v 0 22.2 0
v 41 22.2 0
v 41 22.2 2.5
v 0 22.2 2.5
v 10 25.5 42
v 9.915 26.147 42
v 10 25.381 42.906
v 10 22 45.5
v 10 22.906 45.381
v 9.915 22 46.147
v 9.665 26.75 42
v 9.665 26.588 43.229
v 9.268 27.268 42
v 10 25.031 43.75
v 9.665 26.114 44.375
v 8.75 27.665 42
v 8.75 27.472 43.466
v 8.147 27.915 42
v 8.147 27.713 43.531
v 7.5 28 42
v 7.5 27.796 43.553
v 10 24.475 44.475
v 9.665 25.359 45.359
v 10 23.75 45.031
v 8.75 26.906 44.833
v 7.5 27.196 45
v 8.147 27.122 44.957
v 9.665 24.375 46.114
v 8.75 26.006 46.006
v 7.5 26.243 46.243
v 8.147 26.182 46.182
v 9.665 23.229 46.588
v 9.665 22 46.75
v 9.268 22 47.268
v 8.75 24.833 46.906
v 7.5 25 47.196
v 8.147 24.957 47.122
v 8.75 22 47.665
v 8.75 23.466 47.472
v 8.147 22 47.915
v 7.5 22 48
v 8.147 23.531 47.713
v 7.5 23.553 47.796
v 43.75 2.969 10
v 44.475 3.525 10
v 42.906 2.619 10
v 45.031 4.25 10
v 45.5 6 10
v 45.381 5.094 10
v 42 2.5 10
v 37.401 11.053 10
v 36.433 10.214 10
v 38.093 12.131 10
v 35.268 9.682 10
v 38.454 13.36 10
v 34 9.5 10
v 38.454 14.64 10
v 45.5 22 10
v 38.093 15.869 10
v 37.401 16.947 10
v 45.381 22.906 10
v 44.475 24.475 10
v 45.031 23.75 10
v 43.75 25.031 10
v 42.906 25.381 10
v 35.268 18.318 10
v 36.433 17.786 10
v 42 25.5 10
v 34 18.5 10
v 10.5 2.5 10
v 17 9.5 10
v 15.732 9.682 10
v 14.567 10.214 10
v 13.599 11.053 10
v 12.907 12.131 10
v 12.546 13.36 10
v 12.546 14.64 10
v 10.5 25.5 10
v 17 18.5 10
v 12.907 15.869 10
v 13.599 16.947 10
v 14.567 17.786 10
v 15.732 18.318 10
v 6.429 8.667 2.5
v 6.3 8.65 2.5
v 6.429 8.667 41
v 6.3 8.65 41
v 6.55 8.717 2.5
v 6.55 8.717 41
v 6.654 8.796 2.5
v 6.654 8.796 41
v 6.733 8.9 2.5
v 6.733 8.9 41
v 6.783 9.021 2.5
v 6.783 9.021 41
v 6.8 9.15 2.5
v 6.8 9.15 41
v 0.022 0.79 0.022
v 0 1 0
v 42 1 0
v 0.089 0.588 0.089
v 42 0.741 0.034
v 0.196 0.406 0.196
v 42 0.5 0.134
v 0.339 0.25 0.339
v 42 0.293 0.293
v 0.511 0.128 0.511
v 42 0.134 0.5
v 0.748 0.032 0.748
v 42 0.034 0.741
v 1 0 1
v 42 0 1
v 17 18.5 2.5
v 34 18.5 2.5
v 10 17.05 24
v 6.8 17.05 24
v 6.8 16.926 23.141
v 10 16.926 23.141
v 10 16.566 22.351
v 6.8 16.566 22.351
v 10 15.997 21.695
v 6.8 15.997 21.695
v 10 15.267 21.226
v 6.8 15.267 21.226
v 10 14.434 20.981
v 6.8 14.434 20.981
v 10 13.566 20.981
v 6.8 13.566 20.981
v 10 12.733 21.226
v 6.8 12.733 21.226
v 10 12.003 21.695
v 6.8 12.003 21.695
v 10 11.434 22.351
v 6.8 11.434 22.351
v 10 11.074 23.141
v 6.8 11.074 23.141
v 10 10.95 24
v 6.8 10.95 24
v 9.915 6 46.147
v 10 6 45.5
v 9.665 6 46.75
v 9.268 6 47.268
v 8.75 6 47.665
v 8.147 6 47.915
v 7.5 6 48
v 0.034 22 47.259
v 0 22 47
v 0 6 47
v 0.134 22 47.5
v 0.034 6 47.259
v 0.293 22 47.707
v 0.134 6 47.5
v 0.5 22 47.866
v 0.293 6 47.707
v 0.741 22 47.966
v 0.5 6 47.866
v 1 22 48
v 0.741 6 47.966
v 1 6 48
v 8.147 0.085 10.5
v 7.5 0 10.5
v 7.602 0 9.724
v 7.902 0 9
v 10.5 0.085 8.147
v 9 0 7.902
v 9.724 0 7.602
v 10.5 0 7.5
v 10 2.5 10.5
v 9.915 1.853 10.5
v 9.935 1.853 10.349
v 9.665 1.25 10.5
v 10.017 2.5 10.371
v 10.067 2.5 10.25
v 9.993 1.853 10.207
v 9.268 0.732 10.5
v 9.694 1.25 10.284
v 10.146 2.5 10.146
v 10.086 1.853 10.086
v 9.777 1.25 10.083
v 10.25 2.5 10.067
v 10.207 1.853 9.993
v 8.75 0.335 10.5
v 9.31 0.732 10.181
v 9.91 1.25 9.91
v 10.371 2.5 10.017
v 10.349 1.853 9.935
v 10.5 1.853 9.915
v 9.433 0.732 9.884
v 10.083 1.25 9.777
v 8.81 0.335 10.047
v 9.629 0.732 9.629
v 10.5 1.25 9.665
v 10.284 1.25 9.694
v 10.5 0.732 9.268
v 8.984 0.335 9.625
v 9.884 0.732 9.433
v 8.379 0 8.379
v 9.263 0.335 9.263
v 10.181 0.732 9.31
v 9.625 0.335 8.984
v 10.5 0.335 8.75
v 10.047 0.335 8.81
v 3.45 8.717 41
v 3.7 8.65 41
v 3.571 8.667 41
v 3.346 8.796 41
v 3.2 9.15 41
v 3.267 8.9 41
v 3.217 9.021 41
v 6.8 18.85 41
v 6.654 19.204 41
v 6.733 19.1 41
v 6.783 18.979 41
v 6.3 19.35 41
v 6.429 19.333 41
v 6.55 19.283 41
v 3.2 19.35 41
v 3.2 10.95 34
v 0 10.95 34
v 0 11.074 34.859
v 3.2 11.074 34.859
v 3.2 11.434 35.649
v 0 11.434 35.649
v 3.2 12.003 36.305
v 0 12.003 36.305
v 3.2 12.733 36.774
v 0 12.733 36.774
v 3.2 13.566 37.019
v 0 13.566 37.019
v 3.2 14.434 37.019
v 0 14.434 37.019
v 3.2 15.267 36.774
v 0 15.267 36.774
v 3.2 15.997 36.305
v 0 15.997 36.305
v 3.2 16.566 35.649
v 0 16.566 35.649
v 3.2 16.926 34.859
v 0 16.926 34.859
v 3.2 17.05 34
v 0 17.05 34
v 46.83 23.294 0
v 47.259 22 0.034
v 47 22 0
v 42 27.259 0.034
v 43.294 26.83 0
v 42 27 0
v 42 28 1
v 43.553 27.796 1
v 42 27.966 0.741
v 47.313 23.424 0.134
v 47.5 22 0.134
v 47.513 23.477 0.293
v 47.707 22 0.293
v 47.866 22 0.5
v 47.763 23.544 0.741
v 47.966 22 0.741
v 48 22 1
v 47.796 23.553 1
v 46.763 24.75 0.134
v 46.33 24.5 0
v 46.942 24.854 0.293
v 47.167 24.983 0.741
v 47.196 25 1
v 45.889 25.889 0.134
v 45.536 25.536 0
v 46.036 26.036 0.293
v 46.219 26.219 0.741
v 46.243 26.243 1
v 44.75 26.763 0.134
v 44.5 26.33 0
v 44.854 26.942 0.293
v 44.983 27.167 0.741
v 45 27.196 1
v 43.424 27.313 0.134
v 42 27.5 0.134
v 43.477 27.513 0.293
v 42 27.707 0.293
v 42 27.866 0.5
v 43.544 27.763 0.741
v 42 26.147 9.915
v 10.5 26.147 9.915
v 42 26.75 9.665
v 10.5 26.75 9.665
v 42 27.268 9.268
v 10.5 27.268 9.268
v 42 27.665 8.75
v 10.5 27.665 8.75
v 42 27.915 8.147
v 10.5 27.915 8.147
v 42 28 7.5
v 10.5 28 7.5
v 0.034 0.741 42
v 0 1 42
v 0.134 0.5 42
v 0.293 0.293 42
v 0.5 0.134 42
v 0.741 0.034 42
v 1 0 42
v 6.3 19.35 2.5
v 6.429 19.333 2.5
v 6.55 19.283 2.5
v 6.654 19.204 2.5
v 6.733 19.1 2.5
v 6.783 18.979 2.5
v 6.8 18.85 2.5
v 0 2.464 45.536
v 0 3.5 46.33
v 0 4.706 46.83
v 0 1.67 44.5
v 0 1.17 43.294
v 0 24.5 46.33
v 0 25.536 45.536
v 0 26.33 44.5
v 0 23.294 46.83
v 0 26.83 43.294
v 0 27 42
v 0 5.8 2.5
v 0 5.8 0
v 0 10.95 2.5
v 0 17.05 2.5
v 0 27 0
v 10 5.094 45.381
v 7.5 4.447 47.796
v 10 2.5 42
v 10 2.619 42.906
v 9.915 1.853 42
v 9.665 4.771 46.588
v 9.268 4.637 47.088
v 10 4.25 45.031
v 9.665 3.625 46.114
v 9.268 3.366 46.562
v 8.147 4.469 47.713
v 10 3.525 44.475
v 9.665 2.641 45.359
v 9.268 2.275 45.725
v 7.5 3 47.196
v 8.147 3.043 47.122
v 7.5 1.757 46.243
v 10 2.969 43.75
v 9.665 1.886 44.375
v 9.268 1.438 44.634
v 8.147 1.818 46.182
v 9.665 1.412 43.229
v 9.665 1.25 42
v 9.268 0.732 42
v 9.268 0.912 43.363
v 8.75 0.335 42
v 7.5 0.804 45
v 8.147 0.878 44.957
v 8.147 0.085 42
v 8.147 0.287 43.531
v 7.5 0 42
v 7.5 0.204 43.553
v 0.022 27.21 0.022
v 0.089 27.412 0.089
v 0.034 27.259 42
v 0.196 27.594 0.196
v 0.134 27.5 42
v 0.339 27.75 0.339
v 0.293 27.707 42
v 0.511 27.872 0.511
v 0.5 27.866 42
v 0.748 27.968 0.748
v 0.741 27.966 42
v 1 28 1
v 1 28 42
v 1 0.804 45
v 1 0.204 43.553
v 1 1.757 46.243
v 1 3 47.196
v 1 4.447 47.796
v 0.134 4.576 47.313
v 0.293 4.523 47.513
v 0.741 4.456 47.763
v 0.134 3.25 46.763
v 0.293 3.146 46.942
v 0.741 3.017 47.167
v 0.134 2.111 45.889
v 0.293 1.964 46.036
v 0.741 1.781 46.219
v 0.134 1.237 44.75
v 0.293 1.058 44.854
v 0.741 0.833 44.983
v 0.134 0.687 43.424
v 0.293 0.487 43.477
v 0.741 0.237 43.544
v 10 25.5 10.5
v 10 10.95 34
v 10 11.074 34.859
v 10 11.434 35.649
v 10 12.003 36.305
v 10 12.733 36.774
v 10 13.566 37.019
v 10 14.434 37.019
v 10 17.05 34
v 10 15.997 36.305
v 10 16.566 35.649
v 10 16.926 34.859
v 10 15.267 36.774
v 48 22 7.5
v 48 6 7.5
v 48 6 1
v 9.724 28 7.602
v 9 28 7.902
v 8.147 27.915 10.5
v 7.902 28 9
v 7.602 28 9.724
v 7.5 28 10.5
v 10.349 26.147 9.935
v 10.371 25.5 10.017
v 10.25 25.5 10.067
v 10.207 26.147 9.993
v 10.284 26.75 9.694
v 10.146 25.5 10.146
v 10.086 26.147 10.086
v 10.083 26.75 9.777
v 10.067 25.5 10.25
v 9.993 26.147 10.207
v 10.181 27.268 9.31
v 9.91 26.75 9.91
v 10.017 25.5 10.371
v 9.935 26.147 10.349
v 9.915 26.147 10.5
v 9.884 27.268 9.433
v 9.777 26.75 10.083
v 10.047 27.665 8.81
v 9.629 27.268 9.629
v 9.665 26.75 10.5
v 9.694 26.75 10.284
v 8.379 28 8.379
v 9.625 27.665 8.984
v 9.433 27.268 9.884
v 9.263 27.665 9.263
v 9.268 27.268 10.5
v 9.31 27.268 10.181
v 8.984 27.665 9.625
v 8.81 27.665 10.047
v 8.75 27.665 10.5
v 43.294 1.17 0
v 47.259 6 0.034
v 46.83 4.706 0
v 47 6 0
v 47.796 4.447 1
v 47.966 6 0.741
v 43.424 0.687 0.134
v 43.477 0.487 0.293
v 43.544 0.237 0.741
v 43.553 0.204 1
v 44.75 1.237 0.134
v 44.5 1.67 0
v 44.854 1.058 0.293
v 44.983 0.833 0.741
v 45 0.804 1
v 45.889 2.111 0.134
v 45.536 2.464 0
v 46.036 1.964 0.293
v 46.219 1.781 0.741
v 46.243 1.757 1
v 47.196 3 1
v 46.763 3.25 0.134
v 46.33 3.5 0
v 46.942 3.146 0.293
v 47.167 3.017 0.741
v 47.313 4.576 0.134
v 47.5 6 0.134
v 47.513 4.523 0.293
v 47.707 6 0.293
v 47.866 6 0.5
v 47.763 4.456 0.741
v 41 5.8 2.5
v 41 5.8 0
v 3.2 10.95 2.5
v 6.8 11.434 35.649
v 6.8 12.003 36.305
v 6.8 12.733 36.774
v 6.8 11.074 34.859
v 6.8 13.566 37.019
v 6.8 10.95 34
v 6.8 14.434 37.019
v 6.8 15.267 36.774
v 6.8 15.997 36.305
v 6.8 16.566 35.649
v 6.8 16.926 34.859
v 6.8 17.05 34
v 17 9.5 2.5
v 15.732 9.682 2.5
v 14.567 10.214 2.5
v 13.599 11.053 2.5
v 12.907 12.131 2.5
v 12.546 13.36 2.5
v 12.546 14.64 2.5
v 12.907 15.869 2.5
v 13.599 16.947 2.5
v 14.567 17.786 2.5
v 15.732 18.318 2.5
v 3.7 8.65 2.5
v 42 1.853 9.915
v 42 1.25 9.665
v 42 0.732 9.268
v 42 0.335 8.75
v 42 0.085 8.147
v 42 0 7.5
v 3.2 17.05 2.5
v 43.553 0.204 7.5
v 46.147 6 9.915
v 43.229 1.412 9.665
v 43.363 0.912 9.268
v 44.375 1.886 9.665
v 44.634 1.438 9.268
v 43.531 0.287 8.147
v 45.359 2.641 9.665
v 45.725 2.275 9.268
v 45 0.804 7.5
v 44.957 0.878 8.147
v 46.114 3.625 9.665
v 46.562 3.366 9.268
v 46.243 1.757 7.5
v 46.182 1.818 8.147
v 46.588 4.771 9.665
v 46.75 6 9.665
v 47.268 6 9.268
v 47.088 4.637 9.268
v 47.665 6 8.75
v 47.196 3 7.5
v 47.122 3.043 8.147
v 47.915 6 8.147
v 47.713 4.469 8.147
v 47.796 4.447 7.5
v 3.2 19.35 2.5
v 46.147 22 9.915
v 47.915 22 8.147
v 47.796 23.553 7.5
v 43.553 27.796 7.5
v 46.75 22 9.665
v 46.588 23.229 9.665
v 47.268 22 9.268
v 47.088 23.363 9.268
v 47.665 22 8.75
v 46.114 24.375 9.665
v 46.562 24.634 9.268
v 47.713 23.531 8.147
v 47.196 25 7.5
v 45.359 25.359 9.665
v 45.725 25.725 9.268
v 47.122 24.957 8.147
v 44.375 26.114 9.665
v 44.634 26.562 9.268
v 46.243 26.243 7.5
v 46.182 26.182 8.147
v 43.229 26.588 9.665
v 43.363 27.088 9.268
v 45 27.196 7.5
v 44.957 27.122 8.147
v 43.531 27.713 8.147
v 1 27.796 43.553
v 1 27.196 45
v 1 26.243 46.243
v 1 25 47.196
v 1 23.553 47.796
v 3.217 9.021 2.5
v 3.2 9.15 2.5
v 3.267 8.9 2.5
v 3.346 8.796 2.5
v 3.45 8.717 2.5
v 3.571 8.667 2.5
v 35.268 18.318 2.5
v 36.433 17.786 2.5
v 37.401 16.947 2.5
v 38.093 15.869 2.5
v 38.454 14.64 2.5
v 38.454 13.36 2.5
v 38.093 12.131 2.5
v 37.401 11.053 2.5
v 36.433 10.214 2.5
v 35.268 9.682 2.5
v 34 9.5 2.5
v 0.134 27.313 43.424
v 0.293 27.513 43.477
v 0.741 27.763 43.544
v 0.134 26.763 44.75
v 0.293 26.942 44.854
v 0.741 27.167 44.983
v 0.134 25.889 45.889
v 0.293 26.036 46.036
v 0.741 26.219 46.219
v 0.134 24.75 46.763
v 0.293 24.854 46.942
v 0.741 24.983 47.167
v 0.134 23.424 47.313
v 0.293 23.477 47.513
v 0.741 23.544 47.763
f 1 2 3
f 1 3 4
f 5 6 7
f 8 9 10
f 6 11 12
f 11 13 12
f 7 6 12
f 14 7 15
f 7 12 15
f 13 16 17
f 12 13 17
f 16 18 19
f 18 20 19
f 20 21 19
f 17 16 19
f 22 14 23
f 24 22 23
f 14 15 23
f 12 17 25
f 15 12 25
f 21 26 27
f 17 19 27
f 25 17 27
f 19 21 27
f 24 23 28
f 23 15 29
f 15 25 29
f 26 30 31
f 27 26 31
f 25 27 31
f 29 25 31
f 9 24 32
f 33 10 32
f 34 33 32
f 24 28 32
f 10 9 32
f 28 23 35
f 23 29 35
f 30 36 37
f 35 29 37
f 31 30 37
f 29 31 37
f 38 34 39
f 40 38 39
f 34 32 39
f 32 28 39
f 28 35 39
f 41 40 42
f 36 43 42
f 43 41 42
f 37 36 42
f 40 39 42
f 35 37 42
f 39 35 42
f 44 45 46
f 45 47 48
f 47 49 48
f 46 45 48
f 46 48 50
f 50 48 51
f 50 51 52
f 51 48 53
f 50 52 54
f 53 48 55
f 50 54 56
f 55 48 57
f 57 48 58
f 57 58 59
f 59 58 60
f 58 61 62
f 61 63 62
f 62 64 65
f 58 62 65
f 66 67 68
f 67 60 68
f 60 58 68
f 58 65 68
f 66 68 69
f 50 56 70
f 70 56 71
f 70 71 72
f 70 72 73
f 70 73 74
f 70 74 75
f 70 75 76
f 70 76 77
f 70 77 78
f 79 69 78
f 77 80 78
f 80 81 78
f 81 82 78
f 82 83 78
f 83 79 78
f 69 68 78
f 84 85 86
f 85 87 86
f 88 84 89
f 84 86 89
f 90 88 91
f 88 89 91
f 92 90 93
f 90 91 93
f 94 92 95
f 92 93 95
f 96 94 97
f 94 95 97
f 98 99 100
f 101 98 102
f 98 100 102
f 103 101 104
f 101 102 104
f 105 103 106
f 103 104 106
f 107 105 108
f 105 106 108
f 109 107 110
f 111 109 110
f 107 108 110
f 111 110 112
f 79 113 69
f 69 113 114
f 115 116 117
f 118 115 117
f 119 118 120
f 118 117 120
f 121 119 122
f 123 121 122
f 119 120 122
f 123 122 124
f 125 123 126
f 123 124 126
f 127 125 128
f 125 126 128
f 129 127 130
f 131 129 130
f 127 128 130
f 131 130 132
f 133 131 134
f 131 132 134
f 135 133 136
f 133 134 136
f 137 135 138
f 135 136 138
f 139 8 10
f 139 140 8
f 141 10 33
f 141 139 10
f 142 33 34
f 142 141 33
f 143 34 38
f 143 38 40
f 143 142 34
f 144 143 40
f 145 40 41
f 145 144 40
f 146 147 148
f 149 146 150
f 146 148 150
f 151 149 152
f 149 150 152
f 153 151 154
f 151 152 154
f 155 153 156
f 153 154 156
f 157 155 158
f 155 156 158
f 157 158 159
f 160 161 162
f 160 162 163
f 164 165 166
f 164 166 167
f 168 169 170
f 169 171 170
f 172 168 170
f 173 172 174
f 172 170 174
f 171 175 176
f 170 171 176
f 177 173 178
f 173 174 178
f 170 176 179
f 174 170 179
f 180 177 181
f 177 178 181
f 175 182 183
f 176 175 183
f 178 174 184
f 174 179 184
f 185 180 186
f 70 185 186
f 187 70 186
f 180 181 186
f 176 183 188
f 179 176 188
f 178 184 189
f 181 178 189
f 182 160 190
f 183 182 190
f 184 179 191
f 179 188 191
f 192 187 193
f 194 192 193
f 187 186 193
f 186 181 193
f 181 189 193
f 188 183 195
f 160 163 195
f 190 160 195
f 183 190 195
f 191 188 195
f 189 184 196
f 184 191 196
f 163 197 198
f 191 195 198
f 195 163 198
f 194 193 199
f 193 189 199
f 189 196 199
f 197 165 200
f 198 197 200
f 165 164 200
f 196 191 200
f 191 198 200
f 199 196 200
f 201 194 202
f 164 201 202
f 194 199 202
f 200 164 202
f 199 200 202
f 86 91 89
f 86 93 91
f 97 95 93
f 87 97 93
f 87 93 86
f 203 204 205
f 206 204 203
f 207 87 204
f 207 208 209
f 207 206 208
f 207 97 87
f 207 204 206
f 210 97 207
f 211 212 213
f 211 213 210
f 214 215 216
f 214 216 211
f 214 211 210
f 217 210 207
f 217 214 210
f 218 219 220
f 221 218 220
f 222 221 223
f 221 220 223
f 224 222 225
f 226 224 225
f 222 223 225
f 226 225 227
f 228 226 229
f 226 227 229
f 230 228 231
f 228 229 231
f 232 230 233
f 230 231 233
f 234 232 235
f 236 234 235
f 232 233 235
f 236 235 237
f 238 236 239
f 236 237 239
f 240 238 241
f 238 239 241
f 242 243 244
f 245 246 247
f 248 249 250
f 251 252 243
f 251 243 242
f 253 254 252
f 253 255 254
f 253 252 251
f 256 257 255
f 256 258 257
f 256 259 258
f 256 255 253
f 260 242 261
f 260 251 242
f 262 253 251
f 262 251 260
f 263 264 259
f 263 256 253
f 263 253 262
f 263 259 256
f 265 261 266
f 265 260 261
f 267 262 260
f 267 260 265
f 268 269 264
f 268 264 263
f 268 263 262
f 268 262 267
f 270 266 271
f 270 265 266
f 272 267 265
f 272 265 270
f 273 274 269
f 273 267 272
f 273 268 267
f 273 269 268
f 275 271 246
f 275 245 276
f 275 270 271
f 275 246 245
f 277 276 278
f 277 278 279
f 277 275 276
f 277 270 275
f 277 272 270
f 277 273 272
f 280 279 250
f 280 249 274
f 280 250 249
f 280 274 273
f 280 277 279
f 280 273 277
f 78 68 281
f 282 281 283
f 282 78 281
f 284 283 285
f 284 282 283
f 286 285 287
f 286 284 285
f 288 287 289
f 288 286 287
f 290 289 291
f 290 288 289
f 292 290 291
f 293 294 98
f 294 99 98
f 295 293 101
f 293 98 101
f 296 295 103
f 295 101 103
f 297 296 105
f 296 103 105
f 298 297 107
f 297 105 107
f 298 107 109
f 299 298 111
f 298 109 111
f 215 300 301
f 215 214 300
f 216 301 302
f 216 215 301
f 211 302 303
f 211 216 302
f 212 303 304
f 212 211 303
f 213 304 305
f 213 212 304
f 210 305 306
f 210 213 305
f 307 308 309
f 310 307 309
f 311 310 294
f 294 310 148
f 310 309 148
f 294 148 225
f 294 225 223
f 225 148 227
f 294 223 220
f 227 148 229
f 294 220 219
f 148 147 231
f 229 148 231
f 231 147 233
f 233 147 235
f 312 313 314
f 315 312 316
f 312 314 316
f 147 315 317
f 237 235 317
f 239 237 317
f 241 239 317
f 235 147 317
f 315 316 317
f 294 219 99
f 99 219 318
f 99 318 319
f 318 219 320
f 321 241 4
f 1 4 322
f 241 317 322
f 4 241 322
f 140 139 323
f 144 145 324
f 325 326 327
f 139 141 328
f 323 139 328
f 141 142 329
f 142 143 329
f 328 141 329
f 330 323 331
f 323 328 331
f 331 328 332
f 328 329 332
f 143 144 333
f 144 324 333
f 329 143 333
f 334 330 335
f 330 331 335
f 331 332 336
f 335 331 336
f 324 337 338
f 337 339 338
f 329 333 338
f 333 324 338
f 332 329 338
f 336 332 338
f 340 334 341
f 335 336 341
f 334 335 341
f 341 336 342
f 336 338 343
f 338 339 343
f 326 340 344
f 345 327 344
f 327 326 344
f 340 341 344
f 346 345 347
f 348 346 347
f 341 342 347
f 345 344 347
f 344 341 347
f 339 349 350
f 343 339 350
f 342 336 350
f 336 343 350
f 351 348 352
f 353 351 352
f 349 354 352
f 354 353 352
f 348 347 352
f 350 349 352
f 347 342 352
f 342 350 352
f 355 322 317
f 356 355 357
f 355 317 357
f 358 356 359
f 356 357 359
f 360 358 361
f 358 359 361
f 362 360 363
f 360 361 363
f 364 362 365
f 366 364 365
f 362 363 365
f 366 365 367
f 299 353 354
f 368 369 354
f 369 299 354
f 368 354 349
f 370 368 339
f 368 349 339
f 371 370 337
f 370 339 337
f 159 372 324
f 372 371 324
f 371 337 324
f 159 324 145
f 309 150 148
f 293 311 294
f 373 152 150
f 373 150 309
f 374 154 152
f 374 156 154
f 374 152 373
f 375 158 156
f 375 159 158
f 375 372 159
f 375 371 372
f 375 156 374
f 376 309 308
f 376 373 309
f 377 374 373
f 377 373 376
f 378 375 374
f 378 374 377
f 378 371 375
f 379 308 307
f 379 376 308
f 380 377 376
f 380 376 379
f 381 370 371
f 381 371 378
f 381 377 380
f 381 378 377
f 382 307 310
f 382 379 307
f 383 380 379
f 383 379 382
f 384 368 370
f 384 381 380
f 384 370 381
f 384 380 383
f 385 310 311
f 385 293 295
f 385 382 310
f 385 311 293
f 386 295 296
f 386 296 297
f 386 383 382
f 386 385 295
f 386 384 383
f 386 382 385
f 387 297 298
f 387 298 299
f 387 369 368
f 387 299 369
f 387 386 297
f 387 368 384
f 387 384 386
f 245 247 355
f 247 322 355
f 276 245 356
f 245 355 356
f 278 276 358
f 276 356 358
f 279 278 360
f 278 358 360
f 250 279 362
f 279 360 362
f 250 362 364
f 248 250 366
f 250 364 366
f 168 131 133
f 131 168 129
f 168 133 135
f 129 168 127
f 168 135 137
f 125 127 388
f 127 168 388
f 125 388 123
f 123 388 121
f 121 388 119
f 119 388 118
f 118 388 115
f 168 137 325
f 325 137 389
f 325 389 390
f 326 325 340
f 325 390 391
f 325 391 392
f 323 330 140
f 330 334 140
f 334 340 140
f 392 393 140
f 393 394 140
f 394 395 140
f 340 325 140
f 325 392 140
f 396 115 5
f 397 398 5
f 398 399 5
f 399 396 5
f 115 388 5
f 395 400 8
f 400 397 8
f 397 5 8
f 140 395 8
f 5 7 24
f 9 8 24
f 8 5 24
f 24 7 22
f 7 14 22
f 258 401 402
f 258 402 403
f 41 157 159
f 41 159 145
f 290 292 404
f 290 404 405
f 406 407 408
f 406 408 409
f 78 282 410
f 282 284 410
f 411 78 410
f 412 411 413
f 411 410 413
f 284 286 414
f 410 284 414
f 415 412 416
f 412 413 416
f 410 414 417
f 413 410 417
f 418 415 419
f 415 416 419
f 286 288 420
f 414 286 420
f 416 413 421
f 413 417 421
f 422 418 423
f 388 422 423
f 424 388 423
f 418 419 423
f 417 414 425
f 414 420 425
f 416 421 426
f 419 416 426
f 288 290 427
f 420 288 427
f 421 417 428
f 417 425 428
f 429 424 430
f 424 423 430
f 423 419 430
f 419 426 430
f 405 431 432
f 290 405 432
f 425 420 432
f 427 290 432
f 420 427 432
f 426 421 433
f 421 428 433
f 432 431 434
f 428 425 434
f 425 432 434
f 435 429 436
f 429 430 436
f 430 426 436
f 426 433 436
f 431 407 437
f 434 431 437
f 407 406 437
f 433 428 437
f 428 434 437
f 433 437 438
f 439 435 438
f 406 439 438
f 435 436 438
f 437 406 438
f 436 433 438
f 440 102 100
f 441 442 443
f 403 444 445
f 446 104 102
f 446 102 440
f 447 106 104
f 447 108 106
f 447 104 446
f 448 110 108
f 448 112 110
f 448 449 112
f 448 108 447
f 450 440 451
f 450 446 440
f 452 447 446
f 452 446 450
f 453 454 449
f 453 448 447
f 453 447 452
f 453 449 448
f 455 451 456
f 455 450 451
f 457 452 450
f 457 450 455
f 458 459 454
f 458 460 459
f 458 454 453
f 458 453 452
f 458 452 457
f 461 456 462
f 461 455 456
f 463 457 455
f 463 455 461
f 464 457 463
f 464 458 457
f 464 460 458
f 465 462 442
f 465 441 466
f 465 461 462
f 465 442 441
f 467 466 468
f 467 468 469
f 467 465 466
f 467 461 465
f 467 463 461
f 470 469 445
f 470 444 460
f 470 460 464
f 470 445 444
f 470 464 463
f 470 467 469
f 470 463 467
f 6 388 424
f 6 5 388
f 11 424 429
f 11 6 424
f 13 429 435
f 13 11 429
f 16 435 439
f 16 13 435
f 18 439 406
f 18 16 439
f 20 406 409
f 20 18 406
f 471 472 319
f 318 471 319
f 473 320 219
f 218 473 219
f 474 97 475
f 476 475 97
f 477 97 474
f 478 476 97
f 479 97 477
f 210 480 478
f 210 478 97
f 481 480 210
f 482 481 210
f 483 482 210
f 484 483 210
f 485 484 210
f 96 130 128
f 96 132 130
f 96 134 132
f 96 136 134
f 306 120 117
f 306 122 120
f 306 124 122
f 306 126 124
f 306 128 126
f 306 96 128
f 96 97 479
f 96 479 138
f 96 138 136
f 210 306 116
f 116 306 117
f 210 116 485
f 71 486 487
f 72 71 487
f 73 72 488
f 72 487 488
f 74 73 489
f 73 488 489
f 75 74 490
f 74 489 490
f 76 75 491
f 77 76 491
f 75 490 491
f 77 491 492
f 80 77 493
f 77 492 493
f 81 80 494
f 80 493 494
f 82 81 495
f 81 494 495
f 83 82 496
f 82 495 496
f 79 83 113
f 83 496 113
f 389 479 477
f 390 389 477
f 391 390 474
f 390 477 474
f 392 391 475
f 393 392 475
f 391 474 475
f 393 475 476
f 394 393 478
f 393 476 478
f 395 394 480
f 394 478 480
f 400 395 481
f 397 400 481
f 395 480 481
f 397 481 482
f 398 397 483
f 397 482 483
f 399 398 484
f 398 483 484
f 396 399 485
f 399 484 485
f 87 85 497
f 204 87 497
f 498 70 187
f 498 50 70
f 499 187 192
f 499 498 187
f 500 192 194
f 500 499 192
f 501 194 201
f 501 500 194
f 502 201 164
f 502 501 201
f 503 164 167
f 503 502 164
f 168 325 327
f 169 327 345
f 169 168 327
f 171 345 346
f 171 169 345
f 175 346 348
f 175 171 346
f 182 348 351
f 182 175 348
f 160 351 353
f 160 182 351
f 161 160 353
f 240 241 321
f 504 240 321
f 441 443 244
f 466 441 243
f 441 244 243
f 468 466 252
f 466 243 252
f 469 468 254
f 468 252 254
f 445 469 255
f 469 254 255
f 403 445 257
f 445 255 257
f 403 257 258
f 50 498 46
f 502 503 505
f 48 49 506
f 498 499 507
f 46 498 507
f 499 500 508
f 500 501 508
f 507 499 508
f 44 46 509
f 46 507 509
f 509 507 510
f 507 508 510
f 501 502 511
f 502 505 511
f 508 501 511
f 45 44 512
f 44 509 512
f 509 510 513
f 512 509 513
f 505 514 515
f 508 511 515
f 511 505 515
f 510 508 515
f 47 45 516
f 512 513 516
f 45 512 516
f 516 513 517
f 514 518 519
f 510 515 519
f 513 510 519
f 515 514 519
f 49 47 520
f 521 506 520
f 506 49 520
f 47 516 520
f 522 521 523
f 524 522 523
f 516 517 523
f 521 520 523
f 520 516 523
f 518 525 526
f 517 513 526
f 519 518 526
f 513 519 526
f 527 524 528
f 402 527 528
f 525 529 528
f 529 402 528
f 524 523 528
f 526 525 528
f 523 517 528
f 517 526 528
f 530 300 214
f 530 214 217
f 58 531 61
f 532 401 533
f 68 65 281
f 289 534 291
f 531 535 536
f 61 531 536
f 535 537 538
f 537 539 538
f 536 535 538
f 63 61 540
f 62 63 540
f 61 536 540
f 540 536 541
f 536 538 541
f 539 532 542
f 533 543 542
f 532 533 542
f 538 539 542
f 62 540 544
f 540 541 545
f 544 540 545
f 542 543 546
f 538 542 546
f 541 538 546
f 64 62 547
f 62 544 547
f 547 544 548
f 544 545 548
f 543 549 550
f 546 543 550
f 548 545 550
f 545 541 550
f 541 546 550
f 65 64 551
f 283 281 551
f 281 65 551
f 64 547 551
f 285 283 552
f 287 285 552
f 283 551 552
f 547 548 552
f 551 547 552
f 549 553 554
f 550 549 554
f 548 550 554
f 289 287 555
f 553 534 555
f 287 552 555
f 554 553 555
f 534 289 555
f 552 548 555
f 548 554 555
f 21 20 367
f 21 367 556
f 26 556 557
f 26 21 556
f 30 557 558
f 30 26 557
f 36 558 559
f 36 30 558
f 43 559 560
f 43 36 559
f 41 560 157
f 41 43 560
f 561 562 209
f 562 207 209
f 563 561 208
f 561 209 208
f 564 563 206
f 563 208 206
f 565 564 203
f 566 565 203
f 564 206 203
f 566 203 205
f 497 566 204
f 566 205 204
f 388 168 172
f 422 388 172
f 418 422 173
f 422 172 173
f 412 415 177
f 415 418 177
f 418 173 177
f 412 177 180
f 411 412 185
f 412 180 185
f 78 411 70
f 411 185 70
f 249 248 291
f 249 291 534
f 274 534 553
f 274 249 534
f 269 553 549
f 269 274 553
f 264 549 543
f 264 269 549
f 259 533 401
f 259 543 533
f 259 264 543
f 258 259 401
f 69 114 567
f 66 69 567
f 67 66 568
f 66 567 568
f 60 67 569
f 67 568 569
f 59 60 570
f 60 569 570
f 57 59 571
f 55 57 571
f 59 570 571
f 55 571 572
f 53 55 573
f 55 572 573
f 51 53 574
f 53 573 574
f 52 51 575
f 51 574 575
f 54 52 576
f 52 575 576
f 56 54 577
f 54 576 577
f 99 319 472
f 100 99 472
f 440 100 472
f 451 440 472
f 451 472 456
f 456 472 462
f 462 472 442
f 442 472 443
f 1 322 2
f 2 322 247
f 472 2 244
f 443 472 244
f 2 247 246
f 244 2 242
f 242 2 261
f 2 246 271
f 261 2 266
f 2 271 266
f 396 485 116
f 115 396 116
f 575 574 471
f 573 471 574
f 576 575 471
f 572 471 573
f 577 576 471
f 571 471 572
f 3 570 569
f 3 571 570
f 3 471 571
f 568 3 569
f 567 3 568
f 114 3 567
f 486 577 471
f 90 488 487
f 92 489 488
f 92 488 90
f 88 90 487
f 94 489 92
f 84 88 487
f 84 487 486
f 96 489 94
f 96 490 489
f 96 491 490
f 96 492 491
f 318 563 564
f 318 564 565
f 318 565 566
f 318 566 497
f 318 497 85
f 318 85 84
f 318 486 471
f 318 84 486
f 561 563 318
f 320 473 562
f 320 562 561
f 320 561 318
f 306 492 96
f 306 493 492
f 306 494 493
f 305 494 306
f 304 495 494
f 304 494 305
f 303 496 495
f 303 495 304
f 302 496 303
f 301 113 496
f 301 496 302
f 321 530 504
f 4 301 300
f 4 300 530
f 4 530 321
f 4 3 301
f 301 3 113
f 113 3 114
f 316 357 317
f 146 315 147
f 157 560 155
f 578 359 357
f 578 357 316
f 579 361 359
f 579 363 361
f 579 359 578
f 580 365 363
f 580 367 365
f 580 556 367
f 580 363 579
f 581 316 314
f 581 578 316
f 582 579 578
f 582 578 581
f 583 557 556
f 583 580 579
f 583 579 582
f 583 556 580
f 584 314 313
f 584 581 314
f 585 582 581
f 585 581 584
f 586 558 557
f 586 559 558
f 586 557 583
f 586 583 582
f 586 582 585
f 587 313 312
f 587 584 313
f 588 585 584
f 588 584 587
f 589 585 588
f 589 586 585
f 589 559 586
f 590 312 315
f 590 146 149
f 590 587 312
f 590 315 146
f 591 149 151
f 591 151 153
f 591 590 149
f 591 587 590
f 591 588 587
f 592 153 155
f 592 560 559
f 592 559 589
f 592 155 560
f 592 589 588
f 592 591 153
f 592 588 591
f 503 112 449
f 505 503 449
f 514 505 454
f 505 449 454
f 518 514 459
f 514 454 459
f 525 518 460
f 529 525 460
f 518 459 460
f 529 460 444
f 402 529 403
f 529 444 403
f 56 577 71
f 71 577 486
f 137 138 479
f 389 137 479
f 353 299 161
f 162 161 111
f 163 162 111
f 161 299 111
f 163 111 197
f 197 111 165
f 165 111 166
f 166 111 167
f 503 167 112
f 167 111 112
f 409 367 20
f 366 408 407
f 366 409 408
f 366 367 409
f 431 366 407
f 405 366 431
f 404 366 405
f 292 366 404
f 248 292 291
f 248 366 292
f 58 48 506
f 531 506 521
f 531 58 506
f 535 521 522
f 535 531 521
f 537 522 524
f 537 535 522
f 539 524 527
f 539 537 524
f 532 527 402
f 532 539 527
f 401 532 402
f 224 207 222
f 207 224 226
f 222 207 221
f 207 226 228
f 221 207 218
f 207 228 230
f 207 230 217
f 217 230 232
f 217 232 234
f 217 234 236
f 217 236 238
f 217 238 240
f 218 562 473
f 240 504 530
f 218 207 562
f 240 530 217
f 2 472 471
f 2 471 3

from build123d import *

# Parameters (mm, degrees)
SKETCH1_W           = 48
SKETCH1_H           = 48
BOSS_EXTRUDE1_DEPTH = 28
SKETCH2_W           = 38
SKETCH2_H           = 38
CUT_EXTRUDE1_DEPTH  = 29
SKETCH3_W           = 41
SKETCH3_H           = 16.4
CUT_EXTRUDE2_DEPTH  = 2.5
SKETCH4_W           = 3.6
SKETCH4_H           = 10.7
CUT_EXTRUDE3_DEPTH  = 38.5
CUT_EXTRUDE4_REACH  = 50
CUT_EXTRUDE5_DEPTH  = 42.2
CUT_EXTRUDE6_DEPTH  = 46.5
FILLET1_R           = 6
FILLET2_R           = 0.5
FILLET3_R           = 1
FILLET4_R           = 2.5


with BuildPart() as part:
    # Sketch1 → Boss-Extrude1 (new body)
    with BuildSketch(Plane(origin=(0, 28, 0), x_dir=(1, 0, 0), z_dir=(0, 1, 0))):
        with Locations((24, -24)):
            Rectangle(SKETCH1_W, SKETCH1_H)
    extrude(amount=-BOSS_EXTRUDE1_DEPTH)

    # Sketch2 → Cut-Extrude1 (cut, through all)
    with BuildSketch(Plane(origin=(0, 28, 0), x_dir=(-1, 0, 0), z_dir=(0, 1, 0))):
        with Locations((-29, 29)):
            Rectangle(SKETCH2_W, SKETCH2_H)
    extrude(amount=-CUT_EXTRUDE1_DEPTH, mode=Mode.SUBTRACT)

    # Sketch3 → Cut-Extrude2 (cut)
    with BuildSketch(Plane(origin=(0, 0, 0), x_dir=(-1, 0, 0), z_dir=(0, 0, -1))):
        with Locations((-20.5, 14)):
            Rectangle(SKETCH3_W, SKETCH3_H)
    extrude(amount=-CUT_EXTRUDE2_DEPTH, mode=Mode.SUBTRACT)

    # Sketch4 → Cut-Extrude3 (cut)
    with BuildSketch(Plane(origin=(0, 0, 2.5), x_dir=(-1, 0, 0), z_dir=(0, 0, -1))):
        with Locations((-5, 14)):
            Rectangle(SKETCH4_W, SKETCH4_H)
    extrude(amount=-CUT_EXTRUDE3_DEPTH, mode=Mode.SUBTRACT)

    # Sketch5 → Cut-Extrude4 (cut, up to next)
    with BuildSketch(Plane.ZY, mode=Mode.PRIVATE) as cut_extrude4_sk1:
        with BuildLine():
            Line((2.5, 17.05), (2.5, 10.95))
            Line((2.5, 10.95), (34, 10.95))
            ThreePointArc((34, 10.95), (37.05, 14), (34, 17.05))
            Line((34, 17.05), (2.5, 17.05))
        make_face()
    cut_extrude4_tool1 = extrude(cut_extrude4_sk1.sketch, amount=-CUT_EXTRUDE4_REACH, mode=Mode.PRIVATE) & part.part
    add(cut_extrude4_tool1.solids().sort_by_distance((0, 14, 19.454568))[0], mode=Mode.SUBTRACT)

    # Sketch6 → Cut-Extrude5 (cut, through all)
    with BuildSketch(Plane.ZY.offset(-6.8)):
        with BuildLine():
            Line((34, 17.05), (24, 17.05))
            ThreePointArc((24, 17.05), (20.95, 14), (24, 10.95))
            Line((24, 10.95), (34, 10.95))
            ThreePointArc((34, 10.95), (37.05, 14), (34, 17.05))
        make_face()
    extrude(amount=-CUT_EXTRUDE5_DEPTH, mode=Mode.SUBTRACT)

    # Sketch7 → Cut-Extrude6 (cut, through all)
    with BuildSketch(Plane(origin=(0, 0, 2.5), x_dir=(-1, 0, 0), z_dir=(0, 0, -1))):
        with BuildLine():
            Line((-17, 18.5), (-34, 18.5))
            ThreePointArc((-34, 18.5), (-38.5, 14), (-34, 9.5))
            Line((-34, 9.5), (-17, 9.5))
            ThreePointArc((-17, 9.5), (-12.5, 14), (-17, 18.5))
        make_face()
    extrude(amount=-CUT_EXTRUDE6_DEPTH, mode=Mode.SUBTRACT)

    # Fillet1
    fillet1_edges = [part.edges().sort_by_distance(p)[0] for p in [
        (48, 28, 5),
        (48, 0, 5),
        (5, 28, 48),
        (5, 0, 48),
    ]]
    fillet(fillet1_edges, radius=FILLET1_R)

    # Fillet2
    fillet2_edges = [part.edges().sort_by_distance(p)[0] for p in [
        (10, 14, 10),
        (6.8, 8.65, 21.75),
        (6.8, 19.35, 21.75),
        (3.2, 8.65, 21.75),
    ]]
    fillet(fillet2_edges, radius=FILLET2_R)

    # Fillet3
    fillet3_edges = [part.edges().sort_by_distance(p)[0] for p in [
        (0, 14, 48),
        (21, 0, 0),
        (0, 26.242640687, 46.242640687),
        (0, 1.757359313, 46.242640687),
        (21, 28, 0),
        (48, 14, 0),
        (46.242640687, 26.242640687, 0),
        (46.242640687, 1.757359313, 0),
        (0, 0, 21),
        (0, 28, 21),
    ]]
    fillet(fillet3_edges, radius=FILLET3_R)

    # Fillet4
    fillet4_edges = [part.edges().sort_by_distance(p)[0] for p in [
        (10, 14, 48),
        (10, 26.242640687, 46.242640687),
        (10, 1.757359313, 46.242640687),
        (26.25, 0, 10),
        (26.25, 28, 10),
        (48, 14, 10),
        (46.242640687, 26.242640687, 10),
        (46.242640687, 1.757359313, 10),
        (10, 0, 26.25),
        (10, 28, 26.25),
        (10.146446609, 28, 10.146446609),
        (10.146446609, 0, 10.146446609),
    ]]
    fillet(fillet4_edges, radius=FILLET4_R)


solid = part.part
